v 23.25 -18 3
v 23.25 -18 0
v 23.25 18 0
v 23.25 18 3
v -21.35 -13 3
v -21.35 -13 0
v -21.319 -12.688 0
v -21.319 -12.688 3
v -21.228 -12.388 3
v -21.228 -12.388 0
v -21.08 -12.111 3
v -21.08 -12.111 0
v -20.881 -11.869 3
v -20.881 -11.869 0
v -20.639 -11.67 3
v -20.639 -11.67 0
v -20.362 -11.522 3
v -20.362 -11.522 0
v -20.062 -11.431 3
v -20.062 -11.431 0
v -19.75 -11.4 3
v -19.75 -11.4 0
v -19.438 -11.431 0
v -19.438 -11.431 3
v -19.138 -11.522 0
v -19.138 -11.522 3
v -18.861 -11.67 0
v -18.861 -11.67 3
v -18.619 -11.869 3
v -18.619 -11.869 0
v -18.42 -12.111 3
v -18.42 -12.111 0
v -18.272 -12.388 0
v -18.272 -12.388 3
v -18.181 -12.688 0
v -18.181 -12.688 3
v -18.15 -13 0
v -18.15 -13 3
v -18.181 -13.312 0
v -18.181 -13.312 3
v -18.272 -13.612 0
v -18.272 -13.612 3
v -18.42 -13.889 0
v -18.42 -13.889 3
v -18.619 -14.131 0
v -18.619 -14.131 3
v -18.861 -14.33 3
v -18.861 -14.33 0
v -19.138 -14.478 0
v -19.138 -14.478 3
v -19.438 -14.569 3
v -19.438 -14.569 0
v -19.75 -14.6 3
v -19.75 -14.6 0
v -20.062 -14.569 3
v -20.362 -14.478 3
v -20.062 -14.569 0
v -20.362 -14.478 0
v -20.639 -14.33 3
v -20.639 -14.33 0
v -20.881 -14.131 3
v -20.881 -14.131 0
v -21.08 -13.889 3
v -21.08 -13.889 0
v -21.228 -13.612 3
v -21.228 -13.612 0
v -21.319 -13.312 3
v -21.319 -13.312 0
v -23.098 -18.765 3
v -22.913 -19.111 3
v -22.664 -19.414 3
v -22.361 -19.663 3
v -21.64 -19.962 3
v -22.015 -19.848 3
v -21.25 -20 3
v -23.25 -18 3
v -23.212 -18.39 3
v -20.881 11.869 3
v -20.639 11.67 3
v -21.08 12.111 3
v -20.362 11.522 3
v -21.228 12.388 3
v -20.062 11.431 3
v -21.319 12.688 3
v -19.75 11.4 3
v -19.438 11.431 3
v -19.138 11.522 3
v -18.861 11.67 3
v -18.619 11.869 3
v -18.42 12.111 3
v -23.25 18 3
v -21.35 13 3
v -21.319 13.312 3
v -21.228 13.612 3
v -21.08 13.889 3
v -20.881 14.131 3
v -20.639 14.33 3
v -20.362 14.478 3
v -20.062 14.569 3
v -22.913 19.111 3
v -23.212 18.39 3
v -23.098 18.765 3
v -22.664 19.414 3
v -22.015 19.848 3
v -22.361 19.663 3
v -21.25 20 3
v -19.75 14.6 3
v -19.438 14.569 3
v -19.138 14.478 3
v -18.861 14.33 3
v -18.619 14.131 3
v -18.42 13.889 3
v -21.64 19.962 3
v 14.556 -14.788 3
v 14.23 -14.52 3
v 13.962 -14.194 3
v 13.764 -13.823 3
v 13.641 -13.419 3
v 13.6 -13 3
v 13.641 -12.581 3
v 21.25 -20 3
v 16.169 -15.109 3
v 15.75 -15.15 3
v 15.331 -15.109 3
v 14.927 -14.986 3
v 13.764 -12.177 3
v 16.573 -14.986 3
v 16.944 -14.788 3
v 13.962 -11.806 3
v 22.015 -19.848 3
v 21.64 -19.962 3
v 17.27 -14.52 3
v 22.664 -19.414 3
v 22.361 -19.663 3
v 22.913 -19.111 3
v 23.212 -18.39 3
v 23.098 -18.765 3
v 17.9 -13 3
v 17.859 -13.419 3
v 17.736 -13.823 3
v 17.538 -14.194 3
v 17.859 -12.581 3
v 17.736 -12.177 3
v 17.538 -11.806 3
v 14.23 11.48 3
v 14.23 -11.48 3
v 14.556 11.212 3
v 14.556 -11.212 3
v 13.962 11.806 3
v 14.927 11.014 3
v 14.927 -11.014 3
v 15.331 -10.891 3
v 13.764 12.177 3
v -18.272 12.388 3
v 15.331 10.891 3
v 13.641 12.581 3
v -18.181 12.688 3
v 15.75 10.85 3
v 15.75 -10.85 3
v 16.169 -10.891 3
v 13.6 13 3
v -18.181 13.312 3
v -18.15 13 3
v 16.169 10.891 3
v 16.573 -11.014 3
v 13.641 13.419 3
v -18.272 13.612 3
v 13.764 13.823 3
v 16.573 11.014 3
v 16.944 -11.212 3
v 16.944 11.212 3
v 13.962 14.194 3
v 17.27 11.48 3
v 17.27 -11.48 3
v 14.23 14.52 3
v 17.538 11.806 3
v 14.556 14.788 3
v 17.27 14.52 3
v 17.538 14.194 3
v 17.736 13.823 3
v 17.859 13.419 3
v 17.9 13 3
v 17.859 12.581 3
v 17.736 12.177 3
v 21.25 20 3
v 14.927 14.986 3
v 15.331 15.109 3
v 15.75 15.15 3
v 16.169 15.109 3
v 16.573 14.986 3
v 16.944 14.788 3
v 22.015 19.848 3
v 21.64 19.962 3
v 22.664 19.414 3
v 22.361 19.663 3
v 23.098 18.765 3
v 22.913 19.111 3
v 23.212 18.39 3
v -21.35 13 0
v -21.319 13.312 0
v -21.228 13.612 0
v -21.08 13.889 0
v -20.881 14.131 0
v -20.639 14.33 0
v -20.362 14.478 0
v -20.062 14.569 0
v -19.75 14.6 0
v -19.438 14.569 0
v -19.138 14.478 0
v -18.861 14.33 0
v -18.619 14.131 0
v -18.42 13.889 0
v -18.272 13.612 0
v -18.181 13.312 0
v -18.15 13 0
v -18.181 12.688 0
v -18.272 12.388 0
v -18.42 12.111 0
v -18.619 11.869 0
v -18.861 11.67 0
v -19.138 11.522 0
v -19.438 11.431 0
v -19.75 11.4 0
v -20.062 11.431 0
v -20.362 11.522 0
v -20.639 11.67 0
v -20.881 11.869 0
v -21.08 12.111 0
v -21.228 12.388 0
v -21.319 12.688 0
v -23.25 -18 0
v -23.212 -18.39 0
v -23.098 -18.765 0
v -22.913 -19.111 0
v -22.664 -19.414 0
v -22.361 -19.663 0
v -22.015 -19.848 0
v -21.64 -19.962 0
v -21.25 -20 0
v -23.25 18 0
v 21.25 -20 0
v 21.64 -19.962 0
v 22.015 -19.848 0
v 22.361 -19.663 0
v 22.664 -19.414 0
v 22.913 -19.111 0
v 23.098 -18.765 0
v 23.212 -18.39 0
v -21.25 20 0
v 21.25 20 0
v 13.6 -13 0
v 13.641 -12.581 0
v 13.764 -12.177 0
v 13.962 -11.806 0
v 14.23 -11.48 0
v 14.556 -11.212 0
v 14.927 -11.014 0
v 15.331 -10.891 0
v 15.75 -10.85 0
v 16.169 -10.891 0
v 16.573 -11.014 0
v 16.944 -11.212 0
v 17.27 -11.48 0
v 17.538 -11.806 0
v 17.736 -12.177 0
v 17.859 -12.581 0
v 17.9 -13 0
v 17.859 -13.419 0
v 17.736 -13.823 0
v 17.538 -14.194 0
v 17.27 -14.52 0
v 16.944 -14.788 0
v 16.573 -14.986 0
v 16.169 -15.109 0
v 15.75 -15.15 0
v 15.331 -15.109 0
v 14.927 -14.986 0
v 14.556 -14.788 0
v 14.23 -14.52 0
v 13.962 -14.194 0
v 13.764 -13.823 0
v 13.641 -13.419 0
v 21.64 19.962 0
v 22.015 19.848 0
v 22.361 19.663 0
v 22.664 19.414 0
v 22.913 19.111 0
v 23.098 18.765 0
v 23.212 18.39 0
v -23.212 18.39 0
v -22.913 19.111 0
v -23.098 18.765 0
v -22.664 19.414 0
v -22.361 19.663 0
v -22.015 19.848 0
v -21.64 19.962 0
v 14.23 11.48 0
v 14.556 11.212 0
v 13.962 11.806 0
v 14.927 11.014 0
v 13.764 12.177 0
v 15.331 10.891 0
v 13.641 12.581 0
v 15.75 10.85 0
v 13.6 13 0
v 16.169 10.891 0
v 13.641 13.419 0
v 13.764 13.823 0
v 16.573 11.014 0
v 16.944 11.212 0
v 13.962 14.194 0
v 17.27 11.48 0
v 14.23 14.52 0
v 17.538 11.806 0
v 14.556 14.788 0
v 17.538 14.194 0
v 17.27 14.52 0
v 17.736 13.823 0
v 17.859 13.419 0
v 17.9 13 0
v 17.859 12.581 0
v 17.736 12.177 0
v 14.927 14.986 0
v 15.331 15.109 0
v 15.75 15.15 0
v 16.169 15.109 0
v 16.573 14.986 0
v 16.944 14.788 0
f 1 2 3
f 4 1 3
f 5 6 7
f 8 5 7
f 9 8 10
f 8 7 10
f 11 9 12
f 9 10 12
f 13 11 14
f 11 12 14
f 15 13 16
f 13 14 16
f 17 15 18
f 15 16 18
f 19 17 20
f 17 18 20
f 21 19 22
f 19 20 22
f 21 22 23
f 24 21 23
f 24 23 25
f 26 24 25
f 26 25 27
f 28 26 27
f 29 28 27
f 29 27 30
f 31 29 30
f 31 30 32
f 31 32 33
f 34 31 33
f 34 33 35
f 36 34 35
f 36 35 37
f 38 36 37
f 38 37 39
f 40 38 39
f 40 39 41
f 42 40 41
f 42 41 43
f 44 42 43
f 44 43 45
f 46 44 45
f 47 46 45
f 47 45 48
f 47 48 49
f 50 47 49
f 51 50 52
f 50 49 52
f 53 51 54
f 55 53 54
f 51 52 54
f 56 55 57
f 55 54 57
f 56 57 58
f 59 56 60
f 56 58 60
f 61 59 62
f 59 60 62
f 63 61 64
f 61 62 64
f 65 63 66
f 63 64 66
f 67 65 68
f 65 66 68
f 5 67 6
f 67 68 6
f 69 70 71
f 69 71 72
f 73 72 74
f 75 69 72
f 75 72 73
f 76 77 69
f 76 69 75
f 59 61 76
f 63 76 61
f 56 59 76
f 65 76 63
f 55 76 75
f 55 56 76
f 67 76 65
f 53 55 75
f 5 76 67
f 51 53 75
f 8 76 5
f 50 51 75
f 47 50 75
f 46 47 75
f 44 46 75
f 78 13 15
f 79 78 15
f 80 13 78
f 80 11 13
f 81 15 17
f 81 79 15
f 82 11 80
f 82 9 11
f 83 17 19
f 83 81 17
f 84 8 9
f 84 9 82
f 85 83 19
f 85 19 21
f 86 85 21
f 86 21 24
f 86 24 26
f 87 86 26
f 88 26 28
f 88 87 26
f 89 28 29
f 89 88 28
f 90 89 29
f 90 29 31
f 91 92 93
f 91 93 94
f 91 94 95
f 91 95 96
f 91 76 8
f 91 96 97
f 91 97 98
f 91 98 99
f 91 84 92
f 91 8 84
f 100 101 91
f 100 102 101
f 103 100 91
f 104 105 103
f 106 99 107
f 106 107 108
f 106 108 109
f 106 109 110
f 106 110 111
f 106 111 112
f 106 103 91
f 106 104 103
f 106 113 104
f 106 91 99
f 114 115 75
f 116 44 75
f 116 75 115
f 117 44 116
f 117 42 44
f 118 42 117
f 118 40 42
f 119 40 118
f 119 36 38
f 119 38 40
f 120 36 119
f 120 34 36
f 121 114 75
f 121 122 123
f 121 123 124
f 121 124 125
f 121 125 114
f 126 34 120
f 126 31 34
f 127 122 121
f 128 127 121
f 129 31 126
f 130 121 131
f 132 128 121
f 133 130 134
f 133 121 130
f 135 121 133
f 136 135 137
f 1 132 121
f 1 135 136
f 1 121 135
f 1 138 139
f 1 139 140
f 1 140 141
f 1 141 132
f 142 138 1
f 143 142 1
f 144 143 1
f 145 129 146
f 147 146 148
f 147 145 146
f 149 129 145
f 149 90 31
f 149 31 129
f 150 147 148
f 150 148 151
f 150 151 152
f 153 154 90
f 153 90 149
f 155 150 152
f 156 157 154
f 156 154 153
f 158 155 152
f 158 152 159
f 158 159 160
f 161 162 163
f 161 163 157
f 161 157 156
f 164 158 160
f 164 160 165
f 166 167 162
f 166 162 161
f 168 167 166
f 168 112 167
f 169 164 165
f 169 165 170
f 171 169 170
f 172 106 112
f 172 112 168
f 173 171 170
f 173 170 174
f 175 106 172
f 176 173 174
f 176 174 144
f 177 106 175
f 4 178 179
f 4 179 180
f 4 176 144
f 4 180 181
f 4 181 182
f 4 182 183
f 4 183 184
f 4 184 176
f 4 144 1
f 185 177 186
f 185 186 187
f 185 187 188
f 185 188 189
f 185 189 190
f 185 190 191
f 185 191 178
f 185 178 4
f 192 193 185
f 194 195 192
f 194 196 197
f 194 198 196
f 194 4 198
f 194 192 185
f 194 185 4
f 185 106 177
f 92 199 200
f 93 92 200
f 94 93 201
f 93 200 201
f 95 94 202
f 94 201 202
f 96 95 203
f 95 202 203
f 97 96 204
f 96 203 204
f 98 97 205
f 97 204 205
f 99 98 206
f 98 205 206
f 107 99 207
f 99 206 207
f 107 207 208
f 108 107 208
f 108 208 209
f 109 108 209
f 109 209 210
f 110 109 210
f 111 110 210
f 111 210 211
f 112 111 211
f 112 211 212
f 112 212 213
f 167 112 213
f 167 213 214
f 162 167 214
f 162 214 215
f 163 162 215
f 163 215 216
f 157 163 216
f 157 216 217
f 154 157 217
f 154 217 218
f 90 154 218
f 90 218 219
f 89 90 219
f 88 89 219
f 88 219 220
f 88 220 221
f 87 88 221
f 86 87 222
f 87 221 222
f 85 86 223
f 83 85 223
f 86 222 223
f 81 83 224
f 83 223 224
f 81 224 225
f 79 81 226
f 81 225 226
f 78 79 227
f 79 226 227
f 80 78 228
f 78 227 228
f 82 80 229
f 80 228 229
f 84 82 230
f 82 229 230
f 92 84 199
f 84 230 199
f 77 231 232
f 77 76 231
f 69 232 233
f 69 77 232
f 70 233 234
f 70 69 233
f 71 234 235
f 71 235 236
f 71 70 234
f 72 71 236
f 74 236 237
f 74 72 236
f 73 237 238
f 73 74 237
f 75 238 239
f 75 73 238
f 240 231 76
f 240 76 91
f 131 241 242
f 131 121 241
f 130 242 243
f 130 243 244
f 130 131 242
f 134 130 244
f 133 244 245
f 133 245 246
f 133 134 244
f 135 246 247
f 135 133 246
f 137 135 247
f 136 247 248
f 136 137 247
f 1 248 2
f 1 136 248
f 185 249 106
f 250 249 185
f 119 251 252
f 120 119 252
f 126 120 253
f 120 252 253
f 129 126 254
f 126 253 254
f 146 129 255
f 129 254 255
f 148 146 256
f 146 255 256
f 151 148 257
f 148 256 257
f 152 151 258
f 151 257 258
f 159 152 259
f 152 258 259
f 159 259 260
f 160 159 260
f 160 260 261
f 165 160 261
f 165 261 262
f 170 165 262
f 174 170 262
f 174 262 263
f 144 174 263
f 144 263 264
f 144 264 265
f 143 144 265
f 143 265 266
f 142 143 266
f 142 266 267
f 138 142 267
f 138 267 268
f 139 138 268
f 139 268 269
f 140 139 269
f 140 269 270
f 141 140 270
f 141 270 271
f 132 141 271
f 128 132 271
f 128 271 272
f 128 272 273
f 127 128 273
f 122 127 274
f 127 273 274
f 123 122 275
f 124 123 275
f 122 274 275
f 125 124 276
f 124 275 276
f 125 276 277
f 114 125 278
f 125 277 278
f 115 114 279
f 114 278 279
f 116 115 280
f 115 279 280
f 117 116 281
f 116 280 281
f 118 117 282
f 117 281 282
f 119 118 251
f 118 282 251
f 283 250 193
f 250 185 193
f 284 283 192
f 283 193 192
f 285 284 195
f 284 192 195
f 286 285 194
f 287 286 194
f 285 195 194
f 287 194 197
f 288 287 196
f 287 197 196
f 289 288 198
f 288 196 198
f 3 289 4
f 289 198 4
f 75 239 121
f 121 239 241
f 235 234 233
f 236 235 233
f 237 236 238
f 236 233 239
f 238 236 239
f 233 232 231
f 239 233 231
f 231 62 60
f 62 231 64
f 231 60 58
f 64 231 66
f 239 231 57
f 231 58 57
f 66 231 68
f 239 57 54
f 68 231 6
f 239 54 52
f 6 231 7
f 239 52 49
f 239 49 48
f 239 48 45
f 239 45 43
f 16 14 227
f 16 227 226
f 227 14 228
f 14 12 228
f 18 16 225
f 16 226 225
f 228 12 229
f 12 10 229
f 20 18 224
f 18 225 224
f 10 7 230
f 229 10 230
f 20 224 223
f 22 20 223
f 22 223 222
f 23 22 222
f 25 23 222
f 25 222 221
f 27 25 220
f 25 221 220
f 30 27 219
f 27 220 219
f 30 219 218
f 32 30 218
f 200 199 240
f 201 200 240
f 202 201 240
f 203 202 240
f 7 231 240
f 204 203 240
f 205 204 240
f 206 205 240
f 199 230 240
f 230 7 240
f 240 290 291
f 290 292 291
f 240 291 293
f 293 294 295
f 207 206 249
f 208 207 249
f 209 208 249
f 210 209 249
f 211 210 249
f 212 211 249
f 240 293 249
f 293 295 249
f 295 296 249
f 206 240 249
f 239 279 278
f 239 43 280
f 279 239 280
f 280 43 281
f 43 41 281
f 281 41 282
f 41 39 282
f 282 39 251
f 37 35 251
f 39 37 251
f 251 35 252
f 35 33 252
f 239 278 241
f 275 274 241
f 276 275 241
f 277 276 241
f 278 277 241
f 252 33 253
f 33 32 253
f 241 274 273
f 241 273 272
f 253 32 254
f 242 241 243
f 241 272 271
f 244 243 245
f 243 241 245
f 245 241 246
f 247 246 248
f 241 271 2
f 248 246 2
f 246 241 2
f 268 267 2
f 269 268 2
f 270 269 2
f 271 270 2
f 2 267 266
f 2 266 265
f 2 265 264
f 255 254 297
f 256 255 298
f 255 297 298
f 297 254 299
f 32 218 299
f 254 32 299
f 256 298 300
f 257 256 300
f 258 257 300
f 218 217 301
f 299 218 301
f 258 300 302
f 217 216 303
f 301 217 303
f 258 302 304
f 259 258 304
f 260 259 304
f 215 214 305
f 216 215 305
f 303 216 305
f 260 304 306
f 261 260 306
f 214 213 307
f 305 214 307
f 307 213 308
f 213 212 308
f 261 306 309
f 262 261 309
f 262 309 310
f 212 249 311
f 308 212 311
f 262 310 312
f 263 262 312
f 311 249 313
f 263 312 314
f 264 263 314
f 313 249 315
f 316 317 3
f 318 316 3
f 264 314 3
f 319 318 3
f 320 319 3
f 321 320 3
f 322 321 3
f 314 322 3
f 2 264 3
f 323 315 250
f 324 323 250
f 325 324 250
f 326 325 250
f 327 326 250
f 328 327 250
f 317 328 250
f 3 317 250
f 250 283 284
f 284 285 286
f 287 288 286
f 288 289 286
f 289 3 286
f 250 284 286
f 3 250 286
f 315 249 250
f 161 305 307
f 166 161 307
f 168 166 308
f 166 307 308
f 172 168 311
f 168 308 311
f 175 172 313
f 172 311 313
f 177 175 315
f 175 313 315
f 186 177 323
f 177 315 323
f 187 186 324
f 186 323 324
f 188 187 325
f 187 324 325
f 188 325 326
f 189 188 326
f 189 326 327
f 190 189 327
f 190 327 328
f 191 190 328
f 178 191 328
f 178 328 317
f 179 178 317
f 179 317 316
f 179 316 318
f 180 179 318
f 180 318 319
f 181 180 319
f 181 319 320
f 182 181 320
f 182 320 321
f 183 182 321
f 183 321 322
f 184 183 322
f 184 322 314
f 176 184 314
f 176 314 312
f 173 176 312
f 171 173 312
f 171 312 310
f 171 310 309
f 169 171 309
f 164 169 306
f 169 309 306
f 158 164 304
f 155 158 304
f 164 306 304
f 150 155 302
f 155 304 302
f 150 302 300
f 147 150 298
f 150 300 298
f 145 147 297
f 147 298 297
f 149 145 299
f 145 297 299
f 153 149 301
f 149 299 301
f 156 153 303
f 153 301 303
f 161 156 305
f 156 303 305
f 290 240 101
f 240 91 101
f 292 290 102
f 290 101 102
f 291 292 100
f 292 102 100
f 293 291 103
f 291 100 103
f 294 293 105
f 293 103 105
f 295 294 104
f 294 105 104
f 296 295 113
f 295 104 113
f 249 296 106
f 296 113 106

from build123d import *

# Parameters (mm, degrees)
SKETCH1_W                = 46.5
SKETCH1_H                = 40
BOSS_EXTRUDE1_DEPTH      = 3
M3_CLEARANCE_HOLE1_D     = 3.2
M3_CLEARANCE_HOLE1_DEPTH = 8
M3_CLEARANCE_HOLE1_TIP   = 0.96137699
M4_CLEARANCE_HOLE1_D     = 4.3
M4_CLEARANCE_HOLE1_DEPTH = 8
M4_CLEARANCE_HOLE1_TIP   = 1.291850331
FILLET1_R                = 2


with BuildPart() as part:
    # Sketch1 → Boss-Extrude1 (new body)
    with BuildSketch(Plane.XY):
        Rectangle(SKETCH1_W, SKETCH1_H)
    extrude(amount=BOSS_EXTRUDE1_DEPTH)

    # M3 Clearance Hole1
    with Locations(Plane.XY.offset(3)):
        with Locations((-19.75, 13), (-19.75, -13)):
            Hole(M3_CLEARANCE_HOLE1_D / 2, depth=M3_CLEARANCE_HOLE1_DEPTH)
            with Locations((0, 0, -(M3_CLEARANCE_HOLE1_DEPTH + M3_CLEARANCE_HOLE1_TIP / 2))):  # 118° drill point
                Cone(0, M3_CLEARANCE_HOLE1_D / 2, M3_CLEARANCE_HOLE1_TIP, mode=Mode.SUBTRACT)

    # M4 Clearance Hole1
    with Locations(Plane.XY.offset(3)):
        with Locations((15.75, 13), (15.75, -13)):
            Hole(M4_CLEARANCE_HOLE1_D / 2, depth=M4_CLEARANCE_HOLE1_DEPTH)
            with Locations((0, 0, -(M4_CLEARANCE_HOLE1_DEPTH + M4_CLEARANCE_HOLE1_TIP / 2))):  # 118° drill point
                Cone(0, M4_CLEARANCE_HOLE1_D / 2, M4_CLEARANCE_HOLE1_TIP, mode=Mode.SUBTRACT)

    # Fillet1
    fillet1_edges = [part.edges().sort_by_distance(p)[0] for p in [
        (-23.25, 20, 1.5),
        (23.25, 20, 1.5),
        (23.25, -20, 1.5),
        (-23.25, -20, 1.5),
    ]]
    fillet(fillet1_edges, radius=FILLET1_R)


solid = part.part
